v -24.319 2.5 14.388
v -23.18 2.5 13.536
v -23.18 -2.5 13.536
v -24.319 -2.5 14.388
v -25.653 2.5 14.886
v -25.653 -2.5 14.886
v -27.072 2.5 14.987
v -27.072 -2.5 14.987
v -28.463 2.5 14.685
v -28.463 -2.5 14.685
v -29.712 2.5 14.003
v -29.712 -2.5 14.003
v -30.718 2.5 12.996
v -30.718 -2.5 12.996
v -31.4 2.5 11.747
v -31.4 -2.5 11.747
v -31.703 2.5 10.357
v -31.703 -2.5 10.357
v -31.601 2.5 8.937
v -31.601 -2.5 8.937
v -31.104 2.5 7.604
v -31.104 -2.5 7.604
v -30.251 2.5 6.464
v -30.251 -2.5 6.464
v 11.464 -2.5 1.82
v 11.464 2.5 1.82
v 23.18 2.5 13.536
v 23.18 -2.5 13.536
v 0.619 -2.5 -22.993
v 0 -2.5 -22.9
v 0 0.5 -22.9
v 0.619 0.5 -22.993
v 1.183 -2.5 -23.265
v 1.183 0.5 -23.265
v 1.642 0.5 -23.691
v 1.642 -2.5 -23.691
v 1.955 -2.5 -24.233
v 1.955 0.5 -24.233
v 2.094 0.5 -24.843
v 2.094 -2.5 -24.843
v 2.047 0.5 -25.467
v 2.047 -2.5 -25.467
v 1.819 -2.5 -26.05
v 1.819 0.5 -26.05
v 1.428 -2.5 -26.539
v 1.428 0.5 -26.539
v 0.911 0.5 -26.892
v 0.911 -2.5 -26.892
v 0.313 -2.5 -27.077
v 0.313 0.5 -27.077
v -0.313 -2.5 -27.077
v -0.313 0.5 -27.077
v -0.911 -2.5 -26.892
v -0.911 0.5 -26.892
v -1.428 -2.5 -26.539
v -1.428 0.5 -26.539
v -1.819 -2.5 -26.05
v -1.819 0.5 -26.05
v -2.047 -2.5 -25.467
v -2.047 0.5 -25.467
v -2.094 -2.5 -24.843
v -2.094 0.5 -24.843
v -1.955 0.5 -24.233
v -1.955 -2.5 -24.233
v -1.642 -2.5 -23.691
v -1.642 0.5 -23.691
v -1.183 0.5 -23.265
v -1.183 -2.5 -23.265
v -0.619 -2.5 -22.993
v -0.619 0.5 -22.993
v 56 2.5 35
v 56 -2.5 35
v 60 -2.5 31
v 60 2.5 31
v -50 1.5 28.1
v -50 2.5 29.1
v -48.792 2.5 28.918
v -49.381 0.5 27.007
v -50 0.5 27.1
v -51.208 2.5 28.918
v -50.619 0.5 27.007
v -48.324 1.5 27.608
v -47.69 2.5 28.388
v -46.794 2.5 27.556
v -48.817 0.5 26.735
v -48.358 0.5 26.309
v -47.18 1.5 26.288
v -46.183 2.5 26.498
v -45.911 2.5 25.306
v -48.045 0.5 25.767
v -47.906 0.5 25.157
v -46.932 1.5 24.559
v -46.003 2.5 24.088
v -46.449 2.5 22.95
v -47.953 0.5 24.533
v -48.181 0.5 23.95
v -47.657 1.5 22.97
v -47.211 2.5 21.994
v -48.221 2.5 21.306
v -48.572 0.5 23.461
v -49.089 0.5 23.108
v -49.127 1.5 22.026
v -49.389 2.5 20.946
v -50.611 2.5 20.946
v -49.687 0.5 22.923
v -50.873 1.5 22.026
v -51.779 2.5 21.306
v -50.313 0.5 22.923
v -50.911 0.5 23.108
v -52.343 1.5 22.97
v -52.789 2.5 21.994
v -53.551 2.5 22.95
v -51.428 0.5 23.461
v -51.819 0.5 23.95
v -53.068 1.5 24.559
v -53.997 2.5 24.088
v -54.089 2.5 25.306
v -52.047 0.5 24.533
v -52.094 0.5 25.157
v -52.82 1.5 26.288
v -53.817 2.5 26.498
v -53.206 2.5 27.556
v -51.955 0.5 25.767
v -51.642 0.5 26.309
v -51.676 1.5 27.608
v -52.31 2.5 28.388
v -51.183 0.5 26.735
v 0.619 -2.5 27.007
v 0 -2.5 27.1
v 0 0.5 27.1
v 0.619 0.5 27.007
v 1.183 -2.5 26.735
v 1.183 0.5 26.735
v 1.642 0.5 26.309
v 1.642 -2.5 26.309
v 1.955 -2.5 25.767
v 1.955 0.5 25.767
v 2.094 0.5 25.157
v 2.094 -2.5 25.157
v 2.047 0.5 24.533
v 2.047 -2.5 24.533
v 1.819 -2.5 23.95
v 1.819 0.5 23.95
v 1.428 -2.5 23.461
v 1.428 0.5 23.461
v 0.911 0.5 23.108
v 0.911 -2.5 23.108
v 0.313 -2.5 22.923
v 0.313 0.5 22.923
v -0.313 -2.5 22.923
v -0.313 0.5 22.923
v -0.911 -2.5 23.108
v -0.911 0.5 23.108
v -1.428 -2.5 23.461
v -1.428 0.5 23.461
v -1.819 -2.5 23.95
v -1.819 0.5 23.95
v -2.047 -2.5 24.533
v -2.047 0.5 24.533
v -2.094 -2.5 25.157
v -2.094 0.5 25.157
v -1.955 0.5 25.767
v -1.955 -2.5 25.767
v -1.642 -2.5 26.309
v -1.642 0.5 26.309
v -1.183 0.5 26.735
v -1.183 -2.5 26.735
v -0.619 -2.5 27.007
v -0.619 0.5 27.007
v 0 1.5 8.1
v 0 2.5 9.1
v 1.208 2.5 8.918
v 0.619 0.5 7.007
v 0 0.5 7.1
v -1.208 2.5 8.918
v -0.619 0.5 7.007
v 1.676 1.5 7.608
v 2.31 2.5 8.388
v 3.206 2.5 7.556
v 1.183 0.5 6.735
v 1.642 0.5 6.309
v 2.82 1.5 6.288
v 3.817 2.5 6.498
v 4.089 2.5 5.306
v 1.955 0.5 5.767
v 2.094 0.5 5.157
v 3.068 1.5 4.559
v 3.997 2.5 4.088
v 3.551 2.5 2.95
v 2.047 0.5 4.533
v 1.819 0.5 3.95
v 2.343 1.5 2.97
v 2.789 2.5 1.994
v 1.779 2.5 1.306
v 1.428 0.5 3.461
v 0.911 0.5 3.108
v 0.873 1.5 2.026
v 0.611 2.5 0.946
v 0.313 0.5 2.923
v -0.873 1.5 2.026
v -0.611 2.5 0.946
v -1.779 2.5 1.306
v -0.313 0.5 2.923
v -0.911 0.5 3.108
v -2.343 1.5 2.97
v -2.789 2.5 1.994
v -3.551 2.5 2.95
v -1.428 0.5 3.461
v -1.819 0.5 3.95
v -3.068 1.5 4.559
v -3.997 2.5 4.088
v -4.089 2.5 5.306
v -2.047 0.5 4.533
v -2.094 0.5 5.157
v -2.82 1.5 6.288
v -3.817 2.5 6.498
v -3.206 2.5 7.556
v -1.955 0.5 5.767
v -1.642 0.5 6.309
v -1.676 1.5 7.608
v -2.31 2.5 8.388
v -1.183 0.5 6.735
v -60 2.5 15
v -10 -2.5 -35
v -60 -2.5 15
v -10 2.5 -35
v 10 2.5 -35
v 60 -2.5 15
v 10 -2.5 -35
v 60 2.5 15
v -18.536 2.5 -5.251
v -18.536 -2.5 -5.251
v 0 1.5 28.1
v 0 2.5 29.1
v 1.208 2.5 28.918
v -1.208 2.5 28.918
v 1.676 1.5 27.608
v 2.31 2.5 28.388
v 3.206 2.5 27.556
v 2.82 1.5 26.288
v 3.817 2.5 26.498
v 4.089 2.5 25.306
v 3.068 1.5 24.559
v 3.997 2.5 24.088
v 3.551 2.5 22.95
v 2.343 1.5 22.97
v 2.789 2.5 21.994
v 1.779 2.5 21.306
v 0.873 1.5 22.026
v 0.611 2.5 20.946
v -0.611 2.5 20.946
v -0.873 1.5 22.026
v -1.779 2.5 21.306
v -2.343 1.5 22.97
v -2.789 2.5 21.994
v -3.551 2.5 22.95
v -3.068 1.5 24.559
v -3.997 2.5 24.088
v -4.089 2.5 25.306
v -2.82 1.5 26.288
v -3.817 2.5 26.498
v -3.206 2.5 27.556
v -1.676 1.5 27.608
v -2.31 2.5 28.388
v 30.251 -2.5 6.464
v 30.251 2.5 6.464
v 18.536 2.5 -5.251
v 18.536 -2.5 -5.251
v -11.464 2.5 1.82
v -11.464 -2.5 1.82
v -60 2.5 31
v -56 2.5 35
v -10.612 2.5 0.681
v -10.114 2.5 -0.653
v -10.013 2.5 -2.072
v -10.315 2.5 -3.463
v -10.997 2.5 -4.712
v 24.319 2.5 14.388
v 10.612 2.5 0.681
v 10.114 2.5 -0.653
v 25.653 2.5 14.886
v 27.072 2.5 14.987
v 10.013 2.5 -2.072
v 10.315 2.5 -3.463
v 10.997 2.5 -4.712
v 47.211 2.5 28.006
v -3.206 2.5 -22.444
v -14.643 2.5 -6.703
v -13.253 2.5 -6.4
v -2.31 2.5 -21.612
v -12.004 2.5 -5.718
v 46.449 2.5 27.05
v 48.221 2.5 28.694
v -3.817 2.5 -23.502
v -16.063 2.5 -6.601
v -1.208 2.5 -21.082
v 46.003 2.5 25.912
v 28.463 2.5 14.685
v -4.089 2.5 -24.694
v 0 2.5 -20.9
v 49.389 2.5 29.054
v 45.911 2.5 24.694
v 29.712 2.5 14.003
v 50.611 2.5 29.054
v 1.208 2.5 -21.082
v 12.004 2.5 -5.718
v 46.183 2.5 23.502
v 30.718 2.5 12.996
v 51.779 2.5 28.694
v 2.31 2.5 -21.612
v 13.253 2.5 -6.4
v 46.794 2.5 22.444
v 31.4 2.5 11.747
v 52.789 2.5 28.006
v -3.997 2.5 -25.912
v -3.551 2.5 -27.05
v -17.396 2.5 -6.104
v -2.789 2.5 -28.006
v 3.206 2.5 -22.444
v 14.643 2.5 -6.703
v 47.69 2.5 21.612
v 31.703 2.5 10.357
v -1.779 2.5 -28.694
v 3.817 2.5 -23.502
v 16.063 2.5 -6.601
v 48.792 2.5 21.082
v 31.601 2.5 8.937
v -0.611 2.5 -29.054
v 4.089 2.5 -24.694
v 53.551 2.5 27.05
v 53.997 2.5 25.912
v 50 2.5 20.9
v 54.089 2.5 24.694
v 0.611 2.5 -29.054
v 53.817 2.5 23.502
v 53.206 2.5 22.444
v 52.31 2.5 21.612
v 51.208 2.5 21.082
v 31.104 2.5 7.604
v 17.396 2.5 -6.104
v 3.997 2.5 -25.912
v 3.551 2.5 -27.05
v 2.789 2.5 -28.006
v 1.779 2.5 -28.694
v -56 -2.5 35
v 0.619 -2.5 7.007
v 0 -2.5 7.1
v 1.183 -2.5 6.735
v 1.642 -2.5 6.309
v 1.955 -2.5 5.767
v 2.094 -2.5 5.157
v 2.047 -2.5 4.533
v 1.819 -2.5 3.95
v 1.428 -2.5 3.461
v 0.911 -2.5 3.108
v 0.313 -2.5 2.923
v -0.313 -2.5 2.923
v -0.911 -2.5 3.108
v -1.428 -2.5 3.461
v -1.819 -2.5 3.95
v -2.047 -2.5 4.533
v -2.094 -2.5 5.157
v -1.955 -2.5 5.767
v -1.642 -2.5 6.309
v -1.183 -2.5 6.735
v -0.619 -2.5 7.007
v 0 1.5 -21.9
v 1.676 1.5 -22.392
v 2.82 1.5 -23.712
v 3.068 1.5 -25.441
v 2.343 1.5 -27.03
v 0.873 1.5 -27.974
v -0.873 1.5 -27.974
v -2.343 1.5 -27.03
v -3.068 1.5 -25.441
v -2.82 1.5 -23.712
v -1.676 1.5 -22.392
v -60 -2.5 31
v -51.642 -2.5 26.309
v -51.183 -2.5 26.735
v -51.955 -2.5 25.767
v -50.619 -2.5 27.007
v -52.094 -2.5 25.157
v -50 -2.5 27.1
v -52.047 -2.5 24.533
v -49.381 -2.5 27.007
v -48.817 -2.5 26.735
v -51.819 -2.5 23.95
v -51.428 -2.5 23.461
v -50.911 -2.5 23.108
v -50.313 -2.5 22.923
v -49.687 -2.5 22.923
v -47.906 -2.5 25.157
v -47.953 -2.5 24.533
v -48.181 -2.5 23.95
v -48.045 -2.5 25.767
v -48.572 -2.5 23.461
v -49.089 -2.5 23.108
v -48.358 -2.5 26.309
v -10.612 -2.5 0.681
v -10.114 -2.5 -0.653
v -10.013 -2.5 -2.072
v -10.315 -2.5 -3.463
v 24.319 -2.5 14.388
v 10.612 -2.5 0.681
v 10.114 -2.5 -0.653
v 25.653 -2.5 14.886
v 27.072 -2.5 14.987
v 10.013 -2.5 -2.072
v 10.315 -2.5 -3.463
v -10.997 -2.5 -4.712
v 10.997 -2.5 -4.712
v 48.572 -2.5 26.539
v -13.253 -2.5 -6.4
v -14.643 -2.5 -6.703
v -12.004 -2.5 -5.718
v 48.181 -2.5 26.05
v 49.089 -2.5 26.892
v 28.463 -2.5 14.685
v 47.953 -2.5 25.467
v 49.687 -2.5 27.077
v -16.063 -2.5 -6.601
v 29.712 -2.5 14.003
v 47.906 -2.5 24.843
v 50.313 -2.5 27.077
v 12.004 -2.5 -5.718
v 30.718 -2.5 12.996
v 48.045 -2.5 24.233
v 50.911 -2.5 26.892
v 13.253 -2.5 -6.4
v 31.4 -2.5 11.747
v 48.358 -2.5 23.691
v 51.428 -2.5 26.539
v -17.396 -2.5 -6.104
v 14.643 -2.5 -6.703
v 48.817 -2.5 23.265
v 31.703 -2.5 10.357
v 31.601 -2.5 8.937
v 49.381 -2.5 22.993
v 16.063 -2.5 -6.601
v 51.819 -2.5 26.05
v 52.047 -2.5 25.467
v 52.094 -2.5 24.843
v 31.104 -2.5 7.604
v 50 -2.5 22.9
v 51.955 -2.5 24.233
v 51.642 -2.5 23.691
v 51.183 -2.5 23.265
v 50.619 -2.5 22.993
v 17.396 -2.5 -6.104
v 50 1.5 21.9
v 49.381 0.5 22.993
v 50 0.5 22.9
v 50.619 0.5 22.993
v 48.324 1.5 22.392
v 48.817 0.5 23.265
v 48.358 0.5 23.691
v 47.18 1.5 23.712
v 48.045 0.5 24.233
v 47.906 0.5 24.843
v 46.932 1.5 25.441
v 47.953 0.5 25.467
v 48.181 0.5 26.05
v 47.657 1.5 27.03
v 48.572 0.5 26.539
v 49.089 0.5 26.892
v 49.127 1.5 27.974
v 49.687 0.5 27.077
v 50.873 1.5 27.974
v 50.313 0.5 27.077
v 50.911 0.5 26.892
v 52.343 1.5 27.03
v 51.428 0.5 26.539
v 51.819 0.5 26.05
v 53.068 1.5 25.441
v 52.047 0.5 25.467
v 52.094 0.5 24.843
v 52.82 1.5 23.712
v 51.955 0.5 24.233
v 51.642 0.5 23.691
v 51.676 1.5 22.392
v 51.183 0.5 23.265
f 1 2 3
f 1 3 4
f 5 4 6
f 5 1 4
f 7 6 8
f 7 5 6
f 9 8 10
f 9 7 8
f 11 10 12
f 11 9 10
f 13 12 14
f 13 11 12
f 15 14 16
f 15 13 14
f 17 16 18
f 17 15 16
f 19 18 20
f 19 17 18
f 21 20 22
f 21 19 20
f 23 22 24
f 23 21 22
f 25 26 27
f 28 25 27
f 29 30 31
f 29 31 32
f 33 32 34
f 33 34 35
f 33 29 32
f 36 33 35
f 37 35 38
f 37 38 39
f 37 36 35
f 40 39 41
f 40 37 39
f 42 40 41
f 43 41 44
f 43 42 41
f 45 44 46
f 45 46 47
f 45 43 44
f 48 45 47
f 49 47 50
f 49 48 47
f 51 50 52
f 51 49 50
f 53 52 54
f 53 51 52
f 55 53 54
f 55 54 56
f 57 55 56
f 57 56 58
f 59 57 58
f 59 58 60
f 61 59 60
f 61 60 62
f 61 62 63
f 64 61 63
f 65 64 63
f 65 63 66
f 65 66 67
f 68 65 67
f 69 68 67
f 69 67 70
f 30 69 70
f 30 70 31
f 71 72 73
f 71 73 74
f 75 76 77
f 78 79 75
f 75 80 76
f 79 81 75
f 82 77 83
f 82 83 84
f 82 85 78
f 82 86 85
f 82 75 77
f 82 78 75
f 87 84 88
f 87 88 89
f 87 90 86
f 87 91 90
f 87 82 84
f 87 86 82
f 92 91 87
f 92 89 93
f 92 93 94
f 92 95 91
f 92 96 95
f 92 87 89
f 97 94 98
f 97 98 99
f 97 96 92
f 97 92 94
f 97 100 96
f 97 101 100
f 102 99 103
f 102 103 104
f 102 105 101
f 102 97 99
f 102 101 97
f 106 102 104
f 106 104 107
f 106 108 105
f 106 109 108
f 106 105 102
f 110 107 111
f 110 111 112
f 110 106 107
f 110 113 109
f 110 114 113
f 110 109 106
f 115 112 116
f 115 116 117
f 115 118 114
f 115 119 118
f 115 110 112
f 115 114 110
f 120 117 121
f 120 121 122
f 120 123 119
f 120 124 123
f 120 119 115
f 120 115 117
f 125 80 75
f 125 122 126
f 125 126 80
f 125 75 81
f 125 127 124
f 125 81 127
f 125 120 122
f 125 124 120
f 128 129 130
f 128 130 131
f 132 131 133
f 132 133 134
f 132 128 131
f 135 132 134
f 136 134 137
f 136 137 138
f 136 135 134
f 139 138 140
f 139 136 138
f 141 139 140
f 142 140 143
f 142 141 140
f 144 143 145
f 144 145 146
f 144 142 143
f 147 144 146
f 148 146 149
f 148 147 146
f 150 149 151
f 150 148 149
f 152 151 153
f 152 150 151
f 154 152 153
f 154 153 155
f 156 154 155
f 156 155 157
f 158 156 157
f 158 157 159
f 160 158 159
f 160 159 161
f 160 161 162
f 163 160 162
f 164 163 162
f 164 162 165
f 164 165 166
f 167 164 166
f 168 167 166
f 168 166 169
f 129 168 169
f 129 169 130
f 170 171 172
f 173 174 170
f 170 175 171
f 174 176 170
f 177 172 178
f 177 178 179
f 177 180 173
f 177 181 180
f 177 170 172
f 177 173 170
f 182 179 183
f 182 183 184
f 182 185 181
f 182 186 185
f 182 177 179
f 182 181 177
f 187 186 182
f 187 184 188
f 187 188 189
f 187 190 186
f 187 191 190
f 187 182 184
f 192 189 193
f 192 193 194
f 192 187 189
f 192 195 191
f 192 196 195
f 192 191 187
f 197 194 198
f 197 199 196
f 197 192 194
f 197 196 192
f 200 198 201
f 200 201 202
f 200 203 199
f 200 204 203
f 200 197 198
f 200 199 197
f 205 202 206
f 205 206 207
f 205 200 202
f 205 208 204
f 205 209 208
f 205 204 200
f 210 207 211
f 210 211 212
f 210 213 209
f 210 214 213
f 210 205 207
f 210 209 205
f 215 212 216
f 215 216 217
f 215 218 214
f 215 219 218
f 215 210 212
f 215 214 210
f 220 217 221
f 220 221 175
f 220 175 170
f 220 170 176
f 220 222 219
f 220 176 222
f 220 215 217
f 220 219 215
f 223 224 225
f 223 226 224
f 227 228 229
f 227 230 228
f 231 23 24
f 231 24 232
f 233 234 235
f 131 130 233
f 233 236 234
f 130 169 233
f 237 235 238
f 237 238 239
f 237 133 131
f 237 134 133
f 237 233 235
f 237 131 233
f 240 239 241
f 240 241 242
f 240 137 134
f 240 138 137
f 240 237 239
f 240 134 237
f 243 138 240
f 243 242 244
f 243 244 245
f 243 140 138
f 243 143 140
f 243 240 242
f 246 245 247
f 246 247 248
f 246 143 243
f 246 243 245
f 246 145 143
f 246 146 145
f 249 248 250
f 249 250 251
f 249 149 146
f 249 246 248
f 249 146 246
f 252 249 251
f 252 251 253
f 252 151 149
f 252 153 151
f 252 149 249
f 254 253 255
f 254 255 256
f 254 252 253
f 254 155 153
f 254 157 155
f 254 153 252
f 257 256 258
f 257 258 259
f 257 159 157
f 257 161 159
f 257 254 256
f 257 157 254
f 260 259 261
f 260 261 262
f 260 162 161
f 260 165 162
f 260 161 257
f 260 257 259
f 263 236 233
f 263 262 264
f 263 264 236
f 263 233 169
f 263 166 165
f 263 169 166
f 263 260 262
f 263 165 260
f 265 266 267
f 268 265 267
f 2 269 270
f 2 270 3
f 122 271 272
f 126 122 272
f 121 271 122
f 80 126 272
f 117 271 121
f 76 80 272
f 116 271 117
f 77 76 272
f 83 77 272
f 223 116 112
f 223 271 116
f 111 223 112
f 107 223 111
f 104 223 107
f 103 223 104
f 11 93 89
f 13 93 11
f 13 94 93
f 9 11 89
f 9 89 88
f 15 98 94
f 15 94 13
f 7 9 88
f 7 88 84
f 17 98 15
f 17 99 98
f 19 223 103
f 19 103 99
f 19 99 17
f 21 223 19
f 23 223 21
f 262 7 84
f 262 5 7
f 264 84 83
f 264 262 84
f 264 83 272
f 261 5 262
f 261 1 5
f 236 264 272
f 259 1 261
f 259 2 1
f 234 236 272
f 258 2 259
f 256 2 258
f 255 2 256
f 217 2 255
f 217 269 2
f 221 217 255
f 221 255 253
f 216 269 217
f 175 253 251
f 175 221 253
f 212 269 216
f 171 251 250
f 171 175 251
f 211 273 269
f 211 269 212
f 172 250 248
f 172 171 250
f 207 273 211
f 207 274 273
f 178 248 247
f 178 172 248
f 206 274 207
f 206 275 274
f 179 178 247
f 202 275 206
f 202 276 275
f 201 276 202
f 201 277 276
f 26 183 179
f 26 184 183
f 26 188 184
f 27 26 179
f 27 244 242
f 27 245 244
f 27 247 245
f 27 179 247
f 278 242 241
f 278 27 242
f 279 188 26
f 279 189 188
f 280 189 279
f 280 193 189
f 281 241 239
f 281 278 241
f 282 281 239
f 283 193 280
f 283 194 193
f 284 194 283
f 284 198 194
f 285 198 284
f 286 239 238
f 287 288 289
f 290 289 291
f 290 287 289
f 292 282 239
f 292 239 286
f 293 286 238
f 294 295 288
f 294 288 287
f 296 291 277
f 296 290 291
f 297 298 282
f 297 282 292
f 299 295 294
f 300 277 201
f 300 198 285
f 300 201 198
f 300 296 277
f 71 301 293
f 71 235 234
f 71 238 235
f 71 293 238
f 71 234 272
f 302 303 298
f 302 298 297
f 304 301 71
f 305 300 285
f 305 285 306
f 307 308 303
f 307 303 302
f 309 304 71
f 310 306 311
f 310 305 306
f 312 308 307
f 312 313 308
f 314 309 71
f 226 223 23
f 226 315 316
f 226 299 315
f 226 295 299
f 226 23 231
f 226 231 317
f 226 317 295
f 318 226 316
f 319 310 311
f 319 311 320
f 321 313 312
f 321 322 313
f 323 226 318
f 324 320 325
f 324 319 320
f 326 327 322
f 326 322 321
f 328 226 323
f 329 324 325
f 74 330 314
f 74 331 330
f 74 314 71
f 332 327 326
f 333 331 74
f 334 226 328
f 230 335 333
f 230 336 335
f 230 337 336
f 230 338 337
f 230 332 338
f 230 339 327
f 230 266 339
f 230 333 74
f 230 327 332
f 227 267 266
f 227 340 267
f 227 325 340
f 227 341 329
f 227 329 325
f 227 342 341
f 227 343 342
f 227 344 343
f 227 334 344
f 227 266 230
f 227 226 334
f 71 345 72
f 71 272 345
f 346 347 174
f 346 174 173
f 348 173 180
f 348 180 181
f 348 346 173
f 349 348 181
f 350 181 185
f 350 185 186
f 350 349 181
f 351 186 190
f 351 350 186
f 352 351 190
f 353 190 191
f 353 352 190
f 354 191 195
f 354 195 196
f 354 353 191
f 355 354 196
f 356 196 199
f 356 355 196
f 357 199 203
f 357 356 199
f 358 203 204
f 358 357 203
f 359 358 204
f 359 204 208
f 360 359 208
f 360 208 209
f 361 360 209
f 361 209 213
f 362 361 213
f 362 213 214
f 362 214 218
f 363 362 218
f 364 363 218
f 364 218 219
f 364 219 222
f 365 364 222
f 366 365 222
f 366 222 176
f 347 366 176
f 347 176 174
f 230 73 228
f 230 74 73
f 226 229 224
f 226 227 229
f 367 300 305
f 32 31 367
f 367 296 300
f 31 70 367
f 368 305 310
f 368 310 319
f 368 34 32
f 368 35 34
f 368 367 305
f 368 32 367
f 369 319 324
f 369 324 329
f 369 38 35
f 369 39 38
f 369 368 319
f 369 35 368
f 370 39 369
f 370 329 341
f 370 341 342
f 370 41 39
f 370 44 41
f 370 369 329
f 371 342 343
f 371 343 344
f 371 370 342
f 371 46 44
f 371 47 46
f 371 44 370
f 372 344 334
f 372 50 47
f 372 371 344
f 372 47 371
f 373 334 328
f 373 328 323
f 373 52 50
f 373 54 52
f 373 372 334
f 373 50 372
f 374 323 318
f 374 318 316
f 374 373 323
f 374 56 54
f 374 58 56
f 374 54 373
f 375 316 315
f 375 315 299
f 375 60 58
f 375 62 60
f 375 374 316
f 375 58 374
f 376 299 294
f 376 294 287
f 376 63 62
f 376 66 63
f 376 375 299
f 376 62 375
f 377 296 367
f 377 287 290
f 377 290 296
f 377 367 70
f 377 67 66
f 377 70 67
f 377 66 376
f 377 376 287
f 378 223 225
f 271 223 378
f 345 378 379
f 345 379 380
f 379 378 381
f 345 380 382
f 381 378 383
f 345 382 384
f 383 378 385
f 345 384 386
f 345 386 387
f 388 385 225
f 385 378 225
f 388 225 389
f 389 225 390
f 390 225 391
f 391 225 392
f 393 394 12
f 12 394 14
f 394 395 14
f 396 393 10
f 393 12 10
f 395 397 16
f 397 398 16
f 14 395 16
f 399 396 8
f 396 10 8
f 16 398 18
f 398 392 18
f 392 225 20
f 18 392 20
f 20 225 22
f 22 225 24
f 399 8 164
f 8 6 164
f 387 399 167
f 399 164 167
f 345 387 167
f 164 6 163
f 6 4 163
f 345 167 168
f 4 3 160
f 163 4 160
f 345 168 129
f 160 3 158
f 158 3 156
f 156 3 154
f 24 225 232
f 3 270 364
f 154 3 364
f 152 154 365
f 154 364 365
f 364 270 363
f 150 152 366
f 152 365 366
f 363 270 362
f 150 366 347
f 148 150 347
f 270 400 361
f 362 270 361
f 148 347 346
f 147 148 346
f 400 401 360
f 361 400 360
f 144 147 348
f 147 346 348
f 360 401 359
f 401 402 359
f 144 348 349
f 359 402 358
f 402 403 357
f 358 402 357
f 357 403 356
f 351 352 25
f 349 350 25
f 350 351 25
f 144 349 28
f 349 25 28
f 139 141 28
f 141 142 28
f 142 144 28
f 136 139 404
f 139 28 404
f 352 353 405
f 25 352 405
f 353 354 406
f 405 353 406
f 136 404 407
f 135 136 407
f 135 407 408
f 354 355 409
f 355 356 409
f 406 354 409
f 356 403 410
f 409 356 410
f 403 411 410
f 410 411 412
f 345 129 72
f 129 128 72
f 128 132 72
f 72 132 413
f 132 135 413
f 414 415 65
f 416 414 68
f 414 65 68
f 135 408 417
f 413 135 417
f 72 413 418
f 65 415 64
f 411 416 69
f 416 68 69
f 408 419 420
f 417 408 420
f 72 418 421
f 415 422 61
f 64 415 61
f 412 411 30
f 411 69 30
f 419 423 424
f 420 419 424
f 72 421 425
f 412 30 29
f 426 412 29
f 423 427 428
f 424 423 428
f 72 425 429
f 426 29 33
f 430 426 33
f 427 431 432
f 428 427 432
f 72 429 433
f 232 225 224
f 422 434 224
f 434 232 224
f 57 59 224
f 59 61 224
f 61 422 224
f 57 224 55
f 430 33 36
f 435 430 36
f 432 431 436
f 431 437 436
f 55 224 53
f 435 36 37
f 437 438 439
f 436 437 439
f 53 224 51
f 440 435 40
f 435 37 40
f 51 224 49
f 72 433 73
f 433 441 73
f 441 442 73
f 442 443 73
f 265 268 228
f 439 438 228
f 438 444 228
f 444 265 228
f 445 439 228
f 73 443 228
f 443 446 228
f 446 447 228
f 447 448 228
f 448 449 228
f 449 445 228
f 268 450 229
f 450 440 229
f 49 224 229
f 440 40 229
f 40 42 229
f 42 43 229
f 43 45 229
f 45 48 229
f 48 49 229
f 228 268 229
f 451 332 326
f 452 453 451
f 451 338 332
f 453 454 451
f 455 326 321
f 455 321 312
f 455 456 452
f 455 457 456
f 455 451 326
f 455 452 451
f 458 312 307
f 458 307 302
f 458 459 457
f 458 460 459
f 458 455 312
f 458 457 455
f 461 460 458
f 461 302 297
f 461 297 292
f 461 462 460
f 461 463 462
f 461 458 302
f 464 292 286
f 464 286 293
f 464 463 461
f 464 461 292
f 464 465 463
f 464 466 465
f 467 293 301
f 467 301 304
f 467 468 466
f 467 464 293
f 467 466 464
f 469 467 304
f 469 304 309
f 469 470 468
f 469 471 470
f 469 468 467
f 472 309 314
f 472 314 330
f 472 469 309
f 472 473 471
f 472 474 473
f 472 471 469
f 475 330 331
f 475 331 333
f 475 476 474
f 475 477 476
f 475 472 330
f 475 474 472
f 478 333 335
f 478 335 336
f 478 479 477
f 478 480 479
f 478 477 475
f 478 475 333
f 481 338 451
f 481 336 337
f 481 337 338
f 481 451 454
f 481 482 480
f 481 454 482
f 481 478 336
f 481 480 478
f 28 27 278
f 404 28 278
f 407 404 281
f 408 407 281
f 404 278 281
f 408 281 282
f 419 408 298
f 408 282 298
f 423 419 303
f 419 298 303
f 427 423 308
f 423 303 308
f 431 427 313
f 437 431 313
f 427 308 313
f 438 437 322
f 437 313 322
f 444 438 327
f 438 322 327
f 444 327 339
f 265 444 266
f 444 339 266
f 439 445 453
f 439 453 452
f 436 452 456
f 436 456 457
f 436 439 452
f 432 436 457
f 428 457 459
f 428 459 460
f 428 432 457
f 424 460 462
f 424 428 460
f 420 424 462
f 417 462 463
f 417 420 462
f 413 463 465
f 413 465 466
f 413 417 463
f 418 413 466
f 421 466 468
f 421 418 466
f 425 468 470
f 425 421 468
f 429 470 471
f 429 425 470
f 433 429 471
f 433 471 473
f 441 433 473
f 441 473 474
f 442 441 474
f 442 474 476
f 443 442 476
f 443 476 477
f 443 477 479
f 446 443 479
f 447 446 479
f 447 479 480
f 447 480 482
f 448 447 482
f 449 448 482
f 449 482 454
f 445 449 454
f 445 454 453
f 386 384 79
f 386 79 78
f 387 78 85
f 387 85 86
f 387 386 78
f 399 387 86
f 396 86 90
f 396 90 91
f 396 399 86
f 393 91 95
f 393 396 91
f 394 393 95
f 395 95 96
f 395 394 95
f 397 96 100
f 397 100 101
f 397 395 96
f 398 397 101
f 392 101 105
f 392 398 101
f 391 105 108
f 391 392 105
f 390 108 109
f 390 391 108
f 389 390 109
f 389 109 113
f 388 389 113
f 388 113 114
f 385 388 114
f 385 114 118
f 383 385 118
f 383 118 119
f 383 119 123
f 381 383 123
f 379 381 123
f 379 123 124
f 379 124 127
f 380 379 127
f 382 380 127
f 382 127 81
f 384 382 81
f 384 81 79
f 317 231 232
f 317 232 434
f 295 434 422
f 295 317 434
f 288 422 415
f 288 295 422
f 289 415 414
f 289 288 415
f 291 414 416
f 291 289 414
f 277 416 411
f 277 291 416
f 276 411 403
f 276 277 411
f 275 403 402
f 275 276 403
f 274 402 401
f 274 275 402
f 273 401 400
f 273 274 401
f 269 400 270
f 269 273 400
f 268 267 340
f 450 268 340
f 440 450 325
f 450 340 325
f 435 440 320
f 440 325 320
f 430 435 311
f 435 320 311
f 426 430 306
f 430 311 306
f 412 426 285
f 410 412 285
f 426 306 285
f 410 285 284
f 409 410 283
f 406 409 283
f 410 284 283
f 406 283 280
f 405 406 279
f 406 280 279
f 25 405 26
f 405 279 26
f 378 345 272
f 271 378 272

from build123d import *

# Parameters (mm, degrees)
SKETCH_2_R          = 2.1
EXTRUDE_1_DEPTH     = 2.5
CHAMFER_1_SIZE      = 2
CHAMFER_2_SIZE      = 4
CUT_EXTRUDE_1_DEPTH = 70.641941386


with BuildPart() as part:
    # 草图2 → 凸台-拉伸1 (new, symmetric)
    with BuildSketch(Plane(origin=(0, 0, 0), x_dir=(1, 0, 0), z_dir=(0, 1, 0))):
        Polygon((0, 35), (-10, 35), (-60, -15), (-60, -35), (60, -35), (60, -15), (10, 35), align=None)
        with Locations(Location((-50, -25, 0), (0, 0, 270))):
            Circle(SKETCH_2_R, mode=Mode.SUBTRACT)
        with Locations(Location((0, 25, 0), (0, 0, 270))):
            Circle(SKETCH_2_R, mode=Mode.SUBTRACT)
        with Locations(Location((0, -5, 0), (0, 0, 270))):
            Circle(SKETCH_2_R, mode=Mode.SUBTRACT)
        with Locations(Location((0, -25, 0), (0, 0, 270))):
            Circle(SKETCH_2_R, mode=Mode.SUBTRACT)
        with Locations(Location((50, -25, 0), (0, 0, 90))):
            Circle(SKETCH_2_R, mode=Mode.SUBTRACT)
    extrude(amount=EXTRUDE_1_DEPTH, both=True)

    # 倒角1
    chamfer_1_edges = [part.edges().sort_by_distance(p)[0] for p in [
        (-50, 2.5, 22.9),
        (0, 2.5, -27.1),
        (0, 2.5, 2.9),
        (0, 2.5, 22.9),
        (50, 2.5, 27.1),
    ]]
    chamfer(chamfer_1_edges, length=CHAMFER_1_SIZE)

    # 倒角2
    chamfer_2_edges = [part.edges().sort_by_distance(p)[0] for p in [
        (60, 0, 35),
        (-60, 0, 35),
    ]]
    chamfer(chamfer_2_edges, length=CHAMFER_2_SIZE)

    # 草图3 → 切除-拉伸1 (cut, through all)
    with BuildSketch(Plane(origin=(0, 2.5, 0), x_dir=(1, 0, 0), z_dir=(0, 1, 0))):
        with BuildLine():
            Line((-30.251262658, -6.464466094), (-18.535533906, 5.251262658))
            ThreePointArc((-18.535533906, 5.251262658), (-11.464466094, 5.251262658), (-11.464466094, -1.819805153))
            Line((-11.464466094, -1.819805153), (-23.180194847, -13.535533906))
            ThreePointArc((-23.180194847, -13.535533906), (-30.251262658, -13.535533906), (-30.251262658, -6.464466094))
        make_face()
        with BuildLine():
            Line((30.251262658, -6.464466094), (18.535533906, 5.251262658))
            ThreePointArc((18.535533906, 5.251262658), (11.464466094, 5.251262658), (11.464466094, -1.819805153))
            Line((11.464466094, -1.819805153), (23.180194847, -13.535533906))
            ThreePointArc((23.180194847, -13.535533906), (30.251262658, -13.535533906), (30.251262658, -6.464466094))
        make_face()
    extrude(amount=-CUT_EXTRUDE_1_DEPTH, mode=Mode.SUBTRACT)


solid = part.part
